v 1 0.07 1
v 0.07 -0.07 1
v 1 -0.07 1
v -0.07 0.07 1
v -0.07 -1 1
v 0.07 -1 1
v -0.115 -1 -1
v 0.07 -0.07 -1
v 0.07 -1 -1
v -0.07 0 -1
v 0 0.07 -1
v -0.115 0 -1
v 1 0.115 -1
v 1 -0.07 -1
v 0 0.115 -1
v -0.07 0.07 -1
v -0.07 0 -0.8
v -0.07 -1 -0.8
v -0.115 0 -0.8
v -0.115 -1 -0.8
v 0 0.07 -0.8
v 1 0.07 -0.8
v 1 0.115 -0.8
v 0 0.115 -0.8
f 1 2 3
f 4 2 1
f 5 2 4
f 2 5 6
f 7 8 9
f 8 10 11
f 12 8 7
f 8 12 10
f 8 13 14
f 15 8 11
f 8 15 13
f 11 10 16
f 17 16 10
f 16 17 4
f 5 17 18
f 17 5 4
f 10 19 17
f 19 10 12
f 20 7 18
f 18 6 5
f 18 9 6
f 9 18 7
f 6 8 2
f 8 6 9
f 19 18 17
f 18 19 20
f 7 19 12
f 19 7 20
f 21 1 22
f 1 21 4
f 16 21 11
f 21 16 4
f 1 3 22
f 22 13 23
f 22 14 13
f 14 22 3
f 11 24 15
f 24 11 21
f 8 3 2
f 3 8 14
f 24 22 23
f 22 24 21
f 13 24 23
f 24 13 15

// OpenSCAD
module Wall_04(rot = 0){


module Wall_01(){
    translate([-0.06,0,0])
    color("white")
    cube([0.02,1,2], center= true);
    
    color("#295f48")
    translate([0.06,0,0])
    color("white")
    cube([0.02,1,2], center= true);
    
    
    color("#b2b2b2")
    cube([0.1,1,2], center= true);
    
    translate([-0.09,0,-0.9])    
    color("gray")
    cube([0.05,1,0.2], center= true);

}

rotate([0,0,rot * 90]){
union(){
translate([0,-0.5,0])
Wall_01();

translate([0.5,0,0])
rotate([0,0,-90])
Wall_01();

}

color("white")
translate([-0.035,0.035,0])
rotate([0,0,0])
cube([0.07,0.07,2], center= true);

}
}

Wall_04(rot = 0);

// Written by Nicolì Angelo (Gengio) 2024: 
// MIT License

//Permission is hereby granted, free of charge, to any person obtaining a copy of this software and associated documentation files (the "Software"), to deal in the Software without restriction, including without limitation the rights to use, copy, modify, merge, publish, distribute, sublicense, and/or sell copies of the Software, and to permit persons to whom the Software is furnished to do so, subject to the following conditions:

//The above copyright notice and this permission notice shall be included in all copies or substantial portions of the Software.

//THE SOFTWARE IS PROVIDED "AS IS", WITHOUT WARRANTY OF ANY KIND, EXPRESS OR IMPLIED, INCLUDING BUT NOT LIMITED TO THE WARRANTIES OF MERCHANTABILITY, FITNESS FOR A PARTICULAR PURPOSE AND NONINFRINGEMENT. IN NO EVENT SHALL THE AUTHORS OR COPYRIGHT HOLDERS BE LIABLE FOR ANY CLAIM, DAMAGES OR OTHER LIABILITY, WHETHER IN AN ACTION OF CONTRACT, TORT OR OTHERWISE, ARISING FROM, OUT OF OR IN CONNECTION WITH THE SOFTWARE OR THE USE OR OTHER DEALINGS IN THE SOFTWARE.
